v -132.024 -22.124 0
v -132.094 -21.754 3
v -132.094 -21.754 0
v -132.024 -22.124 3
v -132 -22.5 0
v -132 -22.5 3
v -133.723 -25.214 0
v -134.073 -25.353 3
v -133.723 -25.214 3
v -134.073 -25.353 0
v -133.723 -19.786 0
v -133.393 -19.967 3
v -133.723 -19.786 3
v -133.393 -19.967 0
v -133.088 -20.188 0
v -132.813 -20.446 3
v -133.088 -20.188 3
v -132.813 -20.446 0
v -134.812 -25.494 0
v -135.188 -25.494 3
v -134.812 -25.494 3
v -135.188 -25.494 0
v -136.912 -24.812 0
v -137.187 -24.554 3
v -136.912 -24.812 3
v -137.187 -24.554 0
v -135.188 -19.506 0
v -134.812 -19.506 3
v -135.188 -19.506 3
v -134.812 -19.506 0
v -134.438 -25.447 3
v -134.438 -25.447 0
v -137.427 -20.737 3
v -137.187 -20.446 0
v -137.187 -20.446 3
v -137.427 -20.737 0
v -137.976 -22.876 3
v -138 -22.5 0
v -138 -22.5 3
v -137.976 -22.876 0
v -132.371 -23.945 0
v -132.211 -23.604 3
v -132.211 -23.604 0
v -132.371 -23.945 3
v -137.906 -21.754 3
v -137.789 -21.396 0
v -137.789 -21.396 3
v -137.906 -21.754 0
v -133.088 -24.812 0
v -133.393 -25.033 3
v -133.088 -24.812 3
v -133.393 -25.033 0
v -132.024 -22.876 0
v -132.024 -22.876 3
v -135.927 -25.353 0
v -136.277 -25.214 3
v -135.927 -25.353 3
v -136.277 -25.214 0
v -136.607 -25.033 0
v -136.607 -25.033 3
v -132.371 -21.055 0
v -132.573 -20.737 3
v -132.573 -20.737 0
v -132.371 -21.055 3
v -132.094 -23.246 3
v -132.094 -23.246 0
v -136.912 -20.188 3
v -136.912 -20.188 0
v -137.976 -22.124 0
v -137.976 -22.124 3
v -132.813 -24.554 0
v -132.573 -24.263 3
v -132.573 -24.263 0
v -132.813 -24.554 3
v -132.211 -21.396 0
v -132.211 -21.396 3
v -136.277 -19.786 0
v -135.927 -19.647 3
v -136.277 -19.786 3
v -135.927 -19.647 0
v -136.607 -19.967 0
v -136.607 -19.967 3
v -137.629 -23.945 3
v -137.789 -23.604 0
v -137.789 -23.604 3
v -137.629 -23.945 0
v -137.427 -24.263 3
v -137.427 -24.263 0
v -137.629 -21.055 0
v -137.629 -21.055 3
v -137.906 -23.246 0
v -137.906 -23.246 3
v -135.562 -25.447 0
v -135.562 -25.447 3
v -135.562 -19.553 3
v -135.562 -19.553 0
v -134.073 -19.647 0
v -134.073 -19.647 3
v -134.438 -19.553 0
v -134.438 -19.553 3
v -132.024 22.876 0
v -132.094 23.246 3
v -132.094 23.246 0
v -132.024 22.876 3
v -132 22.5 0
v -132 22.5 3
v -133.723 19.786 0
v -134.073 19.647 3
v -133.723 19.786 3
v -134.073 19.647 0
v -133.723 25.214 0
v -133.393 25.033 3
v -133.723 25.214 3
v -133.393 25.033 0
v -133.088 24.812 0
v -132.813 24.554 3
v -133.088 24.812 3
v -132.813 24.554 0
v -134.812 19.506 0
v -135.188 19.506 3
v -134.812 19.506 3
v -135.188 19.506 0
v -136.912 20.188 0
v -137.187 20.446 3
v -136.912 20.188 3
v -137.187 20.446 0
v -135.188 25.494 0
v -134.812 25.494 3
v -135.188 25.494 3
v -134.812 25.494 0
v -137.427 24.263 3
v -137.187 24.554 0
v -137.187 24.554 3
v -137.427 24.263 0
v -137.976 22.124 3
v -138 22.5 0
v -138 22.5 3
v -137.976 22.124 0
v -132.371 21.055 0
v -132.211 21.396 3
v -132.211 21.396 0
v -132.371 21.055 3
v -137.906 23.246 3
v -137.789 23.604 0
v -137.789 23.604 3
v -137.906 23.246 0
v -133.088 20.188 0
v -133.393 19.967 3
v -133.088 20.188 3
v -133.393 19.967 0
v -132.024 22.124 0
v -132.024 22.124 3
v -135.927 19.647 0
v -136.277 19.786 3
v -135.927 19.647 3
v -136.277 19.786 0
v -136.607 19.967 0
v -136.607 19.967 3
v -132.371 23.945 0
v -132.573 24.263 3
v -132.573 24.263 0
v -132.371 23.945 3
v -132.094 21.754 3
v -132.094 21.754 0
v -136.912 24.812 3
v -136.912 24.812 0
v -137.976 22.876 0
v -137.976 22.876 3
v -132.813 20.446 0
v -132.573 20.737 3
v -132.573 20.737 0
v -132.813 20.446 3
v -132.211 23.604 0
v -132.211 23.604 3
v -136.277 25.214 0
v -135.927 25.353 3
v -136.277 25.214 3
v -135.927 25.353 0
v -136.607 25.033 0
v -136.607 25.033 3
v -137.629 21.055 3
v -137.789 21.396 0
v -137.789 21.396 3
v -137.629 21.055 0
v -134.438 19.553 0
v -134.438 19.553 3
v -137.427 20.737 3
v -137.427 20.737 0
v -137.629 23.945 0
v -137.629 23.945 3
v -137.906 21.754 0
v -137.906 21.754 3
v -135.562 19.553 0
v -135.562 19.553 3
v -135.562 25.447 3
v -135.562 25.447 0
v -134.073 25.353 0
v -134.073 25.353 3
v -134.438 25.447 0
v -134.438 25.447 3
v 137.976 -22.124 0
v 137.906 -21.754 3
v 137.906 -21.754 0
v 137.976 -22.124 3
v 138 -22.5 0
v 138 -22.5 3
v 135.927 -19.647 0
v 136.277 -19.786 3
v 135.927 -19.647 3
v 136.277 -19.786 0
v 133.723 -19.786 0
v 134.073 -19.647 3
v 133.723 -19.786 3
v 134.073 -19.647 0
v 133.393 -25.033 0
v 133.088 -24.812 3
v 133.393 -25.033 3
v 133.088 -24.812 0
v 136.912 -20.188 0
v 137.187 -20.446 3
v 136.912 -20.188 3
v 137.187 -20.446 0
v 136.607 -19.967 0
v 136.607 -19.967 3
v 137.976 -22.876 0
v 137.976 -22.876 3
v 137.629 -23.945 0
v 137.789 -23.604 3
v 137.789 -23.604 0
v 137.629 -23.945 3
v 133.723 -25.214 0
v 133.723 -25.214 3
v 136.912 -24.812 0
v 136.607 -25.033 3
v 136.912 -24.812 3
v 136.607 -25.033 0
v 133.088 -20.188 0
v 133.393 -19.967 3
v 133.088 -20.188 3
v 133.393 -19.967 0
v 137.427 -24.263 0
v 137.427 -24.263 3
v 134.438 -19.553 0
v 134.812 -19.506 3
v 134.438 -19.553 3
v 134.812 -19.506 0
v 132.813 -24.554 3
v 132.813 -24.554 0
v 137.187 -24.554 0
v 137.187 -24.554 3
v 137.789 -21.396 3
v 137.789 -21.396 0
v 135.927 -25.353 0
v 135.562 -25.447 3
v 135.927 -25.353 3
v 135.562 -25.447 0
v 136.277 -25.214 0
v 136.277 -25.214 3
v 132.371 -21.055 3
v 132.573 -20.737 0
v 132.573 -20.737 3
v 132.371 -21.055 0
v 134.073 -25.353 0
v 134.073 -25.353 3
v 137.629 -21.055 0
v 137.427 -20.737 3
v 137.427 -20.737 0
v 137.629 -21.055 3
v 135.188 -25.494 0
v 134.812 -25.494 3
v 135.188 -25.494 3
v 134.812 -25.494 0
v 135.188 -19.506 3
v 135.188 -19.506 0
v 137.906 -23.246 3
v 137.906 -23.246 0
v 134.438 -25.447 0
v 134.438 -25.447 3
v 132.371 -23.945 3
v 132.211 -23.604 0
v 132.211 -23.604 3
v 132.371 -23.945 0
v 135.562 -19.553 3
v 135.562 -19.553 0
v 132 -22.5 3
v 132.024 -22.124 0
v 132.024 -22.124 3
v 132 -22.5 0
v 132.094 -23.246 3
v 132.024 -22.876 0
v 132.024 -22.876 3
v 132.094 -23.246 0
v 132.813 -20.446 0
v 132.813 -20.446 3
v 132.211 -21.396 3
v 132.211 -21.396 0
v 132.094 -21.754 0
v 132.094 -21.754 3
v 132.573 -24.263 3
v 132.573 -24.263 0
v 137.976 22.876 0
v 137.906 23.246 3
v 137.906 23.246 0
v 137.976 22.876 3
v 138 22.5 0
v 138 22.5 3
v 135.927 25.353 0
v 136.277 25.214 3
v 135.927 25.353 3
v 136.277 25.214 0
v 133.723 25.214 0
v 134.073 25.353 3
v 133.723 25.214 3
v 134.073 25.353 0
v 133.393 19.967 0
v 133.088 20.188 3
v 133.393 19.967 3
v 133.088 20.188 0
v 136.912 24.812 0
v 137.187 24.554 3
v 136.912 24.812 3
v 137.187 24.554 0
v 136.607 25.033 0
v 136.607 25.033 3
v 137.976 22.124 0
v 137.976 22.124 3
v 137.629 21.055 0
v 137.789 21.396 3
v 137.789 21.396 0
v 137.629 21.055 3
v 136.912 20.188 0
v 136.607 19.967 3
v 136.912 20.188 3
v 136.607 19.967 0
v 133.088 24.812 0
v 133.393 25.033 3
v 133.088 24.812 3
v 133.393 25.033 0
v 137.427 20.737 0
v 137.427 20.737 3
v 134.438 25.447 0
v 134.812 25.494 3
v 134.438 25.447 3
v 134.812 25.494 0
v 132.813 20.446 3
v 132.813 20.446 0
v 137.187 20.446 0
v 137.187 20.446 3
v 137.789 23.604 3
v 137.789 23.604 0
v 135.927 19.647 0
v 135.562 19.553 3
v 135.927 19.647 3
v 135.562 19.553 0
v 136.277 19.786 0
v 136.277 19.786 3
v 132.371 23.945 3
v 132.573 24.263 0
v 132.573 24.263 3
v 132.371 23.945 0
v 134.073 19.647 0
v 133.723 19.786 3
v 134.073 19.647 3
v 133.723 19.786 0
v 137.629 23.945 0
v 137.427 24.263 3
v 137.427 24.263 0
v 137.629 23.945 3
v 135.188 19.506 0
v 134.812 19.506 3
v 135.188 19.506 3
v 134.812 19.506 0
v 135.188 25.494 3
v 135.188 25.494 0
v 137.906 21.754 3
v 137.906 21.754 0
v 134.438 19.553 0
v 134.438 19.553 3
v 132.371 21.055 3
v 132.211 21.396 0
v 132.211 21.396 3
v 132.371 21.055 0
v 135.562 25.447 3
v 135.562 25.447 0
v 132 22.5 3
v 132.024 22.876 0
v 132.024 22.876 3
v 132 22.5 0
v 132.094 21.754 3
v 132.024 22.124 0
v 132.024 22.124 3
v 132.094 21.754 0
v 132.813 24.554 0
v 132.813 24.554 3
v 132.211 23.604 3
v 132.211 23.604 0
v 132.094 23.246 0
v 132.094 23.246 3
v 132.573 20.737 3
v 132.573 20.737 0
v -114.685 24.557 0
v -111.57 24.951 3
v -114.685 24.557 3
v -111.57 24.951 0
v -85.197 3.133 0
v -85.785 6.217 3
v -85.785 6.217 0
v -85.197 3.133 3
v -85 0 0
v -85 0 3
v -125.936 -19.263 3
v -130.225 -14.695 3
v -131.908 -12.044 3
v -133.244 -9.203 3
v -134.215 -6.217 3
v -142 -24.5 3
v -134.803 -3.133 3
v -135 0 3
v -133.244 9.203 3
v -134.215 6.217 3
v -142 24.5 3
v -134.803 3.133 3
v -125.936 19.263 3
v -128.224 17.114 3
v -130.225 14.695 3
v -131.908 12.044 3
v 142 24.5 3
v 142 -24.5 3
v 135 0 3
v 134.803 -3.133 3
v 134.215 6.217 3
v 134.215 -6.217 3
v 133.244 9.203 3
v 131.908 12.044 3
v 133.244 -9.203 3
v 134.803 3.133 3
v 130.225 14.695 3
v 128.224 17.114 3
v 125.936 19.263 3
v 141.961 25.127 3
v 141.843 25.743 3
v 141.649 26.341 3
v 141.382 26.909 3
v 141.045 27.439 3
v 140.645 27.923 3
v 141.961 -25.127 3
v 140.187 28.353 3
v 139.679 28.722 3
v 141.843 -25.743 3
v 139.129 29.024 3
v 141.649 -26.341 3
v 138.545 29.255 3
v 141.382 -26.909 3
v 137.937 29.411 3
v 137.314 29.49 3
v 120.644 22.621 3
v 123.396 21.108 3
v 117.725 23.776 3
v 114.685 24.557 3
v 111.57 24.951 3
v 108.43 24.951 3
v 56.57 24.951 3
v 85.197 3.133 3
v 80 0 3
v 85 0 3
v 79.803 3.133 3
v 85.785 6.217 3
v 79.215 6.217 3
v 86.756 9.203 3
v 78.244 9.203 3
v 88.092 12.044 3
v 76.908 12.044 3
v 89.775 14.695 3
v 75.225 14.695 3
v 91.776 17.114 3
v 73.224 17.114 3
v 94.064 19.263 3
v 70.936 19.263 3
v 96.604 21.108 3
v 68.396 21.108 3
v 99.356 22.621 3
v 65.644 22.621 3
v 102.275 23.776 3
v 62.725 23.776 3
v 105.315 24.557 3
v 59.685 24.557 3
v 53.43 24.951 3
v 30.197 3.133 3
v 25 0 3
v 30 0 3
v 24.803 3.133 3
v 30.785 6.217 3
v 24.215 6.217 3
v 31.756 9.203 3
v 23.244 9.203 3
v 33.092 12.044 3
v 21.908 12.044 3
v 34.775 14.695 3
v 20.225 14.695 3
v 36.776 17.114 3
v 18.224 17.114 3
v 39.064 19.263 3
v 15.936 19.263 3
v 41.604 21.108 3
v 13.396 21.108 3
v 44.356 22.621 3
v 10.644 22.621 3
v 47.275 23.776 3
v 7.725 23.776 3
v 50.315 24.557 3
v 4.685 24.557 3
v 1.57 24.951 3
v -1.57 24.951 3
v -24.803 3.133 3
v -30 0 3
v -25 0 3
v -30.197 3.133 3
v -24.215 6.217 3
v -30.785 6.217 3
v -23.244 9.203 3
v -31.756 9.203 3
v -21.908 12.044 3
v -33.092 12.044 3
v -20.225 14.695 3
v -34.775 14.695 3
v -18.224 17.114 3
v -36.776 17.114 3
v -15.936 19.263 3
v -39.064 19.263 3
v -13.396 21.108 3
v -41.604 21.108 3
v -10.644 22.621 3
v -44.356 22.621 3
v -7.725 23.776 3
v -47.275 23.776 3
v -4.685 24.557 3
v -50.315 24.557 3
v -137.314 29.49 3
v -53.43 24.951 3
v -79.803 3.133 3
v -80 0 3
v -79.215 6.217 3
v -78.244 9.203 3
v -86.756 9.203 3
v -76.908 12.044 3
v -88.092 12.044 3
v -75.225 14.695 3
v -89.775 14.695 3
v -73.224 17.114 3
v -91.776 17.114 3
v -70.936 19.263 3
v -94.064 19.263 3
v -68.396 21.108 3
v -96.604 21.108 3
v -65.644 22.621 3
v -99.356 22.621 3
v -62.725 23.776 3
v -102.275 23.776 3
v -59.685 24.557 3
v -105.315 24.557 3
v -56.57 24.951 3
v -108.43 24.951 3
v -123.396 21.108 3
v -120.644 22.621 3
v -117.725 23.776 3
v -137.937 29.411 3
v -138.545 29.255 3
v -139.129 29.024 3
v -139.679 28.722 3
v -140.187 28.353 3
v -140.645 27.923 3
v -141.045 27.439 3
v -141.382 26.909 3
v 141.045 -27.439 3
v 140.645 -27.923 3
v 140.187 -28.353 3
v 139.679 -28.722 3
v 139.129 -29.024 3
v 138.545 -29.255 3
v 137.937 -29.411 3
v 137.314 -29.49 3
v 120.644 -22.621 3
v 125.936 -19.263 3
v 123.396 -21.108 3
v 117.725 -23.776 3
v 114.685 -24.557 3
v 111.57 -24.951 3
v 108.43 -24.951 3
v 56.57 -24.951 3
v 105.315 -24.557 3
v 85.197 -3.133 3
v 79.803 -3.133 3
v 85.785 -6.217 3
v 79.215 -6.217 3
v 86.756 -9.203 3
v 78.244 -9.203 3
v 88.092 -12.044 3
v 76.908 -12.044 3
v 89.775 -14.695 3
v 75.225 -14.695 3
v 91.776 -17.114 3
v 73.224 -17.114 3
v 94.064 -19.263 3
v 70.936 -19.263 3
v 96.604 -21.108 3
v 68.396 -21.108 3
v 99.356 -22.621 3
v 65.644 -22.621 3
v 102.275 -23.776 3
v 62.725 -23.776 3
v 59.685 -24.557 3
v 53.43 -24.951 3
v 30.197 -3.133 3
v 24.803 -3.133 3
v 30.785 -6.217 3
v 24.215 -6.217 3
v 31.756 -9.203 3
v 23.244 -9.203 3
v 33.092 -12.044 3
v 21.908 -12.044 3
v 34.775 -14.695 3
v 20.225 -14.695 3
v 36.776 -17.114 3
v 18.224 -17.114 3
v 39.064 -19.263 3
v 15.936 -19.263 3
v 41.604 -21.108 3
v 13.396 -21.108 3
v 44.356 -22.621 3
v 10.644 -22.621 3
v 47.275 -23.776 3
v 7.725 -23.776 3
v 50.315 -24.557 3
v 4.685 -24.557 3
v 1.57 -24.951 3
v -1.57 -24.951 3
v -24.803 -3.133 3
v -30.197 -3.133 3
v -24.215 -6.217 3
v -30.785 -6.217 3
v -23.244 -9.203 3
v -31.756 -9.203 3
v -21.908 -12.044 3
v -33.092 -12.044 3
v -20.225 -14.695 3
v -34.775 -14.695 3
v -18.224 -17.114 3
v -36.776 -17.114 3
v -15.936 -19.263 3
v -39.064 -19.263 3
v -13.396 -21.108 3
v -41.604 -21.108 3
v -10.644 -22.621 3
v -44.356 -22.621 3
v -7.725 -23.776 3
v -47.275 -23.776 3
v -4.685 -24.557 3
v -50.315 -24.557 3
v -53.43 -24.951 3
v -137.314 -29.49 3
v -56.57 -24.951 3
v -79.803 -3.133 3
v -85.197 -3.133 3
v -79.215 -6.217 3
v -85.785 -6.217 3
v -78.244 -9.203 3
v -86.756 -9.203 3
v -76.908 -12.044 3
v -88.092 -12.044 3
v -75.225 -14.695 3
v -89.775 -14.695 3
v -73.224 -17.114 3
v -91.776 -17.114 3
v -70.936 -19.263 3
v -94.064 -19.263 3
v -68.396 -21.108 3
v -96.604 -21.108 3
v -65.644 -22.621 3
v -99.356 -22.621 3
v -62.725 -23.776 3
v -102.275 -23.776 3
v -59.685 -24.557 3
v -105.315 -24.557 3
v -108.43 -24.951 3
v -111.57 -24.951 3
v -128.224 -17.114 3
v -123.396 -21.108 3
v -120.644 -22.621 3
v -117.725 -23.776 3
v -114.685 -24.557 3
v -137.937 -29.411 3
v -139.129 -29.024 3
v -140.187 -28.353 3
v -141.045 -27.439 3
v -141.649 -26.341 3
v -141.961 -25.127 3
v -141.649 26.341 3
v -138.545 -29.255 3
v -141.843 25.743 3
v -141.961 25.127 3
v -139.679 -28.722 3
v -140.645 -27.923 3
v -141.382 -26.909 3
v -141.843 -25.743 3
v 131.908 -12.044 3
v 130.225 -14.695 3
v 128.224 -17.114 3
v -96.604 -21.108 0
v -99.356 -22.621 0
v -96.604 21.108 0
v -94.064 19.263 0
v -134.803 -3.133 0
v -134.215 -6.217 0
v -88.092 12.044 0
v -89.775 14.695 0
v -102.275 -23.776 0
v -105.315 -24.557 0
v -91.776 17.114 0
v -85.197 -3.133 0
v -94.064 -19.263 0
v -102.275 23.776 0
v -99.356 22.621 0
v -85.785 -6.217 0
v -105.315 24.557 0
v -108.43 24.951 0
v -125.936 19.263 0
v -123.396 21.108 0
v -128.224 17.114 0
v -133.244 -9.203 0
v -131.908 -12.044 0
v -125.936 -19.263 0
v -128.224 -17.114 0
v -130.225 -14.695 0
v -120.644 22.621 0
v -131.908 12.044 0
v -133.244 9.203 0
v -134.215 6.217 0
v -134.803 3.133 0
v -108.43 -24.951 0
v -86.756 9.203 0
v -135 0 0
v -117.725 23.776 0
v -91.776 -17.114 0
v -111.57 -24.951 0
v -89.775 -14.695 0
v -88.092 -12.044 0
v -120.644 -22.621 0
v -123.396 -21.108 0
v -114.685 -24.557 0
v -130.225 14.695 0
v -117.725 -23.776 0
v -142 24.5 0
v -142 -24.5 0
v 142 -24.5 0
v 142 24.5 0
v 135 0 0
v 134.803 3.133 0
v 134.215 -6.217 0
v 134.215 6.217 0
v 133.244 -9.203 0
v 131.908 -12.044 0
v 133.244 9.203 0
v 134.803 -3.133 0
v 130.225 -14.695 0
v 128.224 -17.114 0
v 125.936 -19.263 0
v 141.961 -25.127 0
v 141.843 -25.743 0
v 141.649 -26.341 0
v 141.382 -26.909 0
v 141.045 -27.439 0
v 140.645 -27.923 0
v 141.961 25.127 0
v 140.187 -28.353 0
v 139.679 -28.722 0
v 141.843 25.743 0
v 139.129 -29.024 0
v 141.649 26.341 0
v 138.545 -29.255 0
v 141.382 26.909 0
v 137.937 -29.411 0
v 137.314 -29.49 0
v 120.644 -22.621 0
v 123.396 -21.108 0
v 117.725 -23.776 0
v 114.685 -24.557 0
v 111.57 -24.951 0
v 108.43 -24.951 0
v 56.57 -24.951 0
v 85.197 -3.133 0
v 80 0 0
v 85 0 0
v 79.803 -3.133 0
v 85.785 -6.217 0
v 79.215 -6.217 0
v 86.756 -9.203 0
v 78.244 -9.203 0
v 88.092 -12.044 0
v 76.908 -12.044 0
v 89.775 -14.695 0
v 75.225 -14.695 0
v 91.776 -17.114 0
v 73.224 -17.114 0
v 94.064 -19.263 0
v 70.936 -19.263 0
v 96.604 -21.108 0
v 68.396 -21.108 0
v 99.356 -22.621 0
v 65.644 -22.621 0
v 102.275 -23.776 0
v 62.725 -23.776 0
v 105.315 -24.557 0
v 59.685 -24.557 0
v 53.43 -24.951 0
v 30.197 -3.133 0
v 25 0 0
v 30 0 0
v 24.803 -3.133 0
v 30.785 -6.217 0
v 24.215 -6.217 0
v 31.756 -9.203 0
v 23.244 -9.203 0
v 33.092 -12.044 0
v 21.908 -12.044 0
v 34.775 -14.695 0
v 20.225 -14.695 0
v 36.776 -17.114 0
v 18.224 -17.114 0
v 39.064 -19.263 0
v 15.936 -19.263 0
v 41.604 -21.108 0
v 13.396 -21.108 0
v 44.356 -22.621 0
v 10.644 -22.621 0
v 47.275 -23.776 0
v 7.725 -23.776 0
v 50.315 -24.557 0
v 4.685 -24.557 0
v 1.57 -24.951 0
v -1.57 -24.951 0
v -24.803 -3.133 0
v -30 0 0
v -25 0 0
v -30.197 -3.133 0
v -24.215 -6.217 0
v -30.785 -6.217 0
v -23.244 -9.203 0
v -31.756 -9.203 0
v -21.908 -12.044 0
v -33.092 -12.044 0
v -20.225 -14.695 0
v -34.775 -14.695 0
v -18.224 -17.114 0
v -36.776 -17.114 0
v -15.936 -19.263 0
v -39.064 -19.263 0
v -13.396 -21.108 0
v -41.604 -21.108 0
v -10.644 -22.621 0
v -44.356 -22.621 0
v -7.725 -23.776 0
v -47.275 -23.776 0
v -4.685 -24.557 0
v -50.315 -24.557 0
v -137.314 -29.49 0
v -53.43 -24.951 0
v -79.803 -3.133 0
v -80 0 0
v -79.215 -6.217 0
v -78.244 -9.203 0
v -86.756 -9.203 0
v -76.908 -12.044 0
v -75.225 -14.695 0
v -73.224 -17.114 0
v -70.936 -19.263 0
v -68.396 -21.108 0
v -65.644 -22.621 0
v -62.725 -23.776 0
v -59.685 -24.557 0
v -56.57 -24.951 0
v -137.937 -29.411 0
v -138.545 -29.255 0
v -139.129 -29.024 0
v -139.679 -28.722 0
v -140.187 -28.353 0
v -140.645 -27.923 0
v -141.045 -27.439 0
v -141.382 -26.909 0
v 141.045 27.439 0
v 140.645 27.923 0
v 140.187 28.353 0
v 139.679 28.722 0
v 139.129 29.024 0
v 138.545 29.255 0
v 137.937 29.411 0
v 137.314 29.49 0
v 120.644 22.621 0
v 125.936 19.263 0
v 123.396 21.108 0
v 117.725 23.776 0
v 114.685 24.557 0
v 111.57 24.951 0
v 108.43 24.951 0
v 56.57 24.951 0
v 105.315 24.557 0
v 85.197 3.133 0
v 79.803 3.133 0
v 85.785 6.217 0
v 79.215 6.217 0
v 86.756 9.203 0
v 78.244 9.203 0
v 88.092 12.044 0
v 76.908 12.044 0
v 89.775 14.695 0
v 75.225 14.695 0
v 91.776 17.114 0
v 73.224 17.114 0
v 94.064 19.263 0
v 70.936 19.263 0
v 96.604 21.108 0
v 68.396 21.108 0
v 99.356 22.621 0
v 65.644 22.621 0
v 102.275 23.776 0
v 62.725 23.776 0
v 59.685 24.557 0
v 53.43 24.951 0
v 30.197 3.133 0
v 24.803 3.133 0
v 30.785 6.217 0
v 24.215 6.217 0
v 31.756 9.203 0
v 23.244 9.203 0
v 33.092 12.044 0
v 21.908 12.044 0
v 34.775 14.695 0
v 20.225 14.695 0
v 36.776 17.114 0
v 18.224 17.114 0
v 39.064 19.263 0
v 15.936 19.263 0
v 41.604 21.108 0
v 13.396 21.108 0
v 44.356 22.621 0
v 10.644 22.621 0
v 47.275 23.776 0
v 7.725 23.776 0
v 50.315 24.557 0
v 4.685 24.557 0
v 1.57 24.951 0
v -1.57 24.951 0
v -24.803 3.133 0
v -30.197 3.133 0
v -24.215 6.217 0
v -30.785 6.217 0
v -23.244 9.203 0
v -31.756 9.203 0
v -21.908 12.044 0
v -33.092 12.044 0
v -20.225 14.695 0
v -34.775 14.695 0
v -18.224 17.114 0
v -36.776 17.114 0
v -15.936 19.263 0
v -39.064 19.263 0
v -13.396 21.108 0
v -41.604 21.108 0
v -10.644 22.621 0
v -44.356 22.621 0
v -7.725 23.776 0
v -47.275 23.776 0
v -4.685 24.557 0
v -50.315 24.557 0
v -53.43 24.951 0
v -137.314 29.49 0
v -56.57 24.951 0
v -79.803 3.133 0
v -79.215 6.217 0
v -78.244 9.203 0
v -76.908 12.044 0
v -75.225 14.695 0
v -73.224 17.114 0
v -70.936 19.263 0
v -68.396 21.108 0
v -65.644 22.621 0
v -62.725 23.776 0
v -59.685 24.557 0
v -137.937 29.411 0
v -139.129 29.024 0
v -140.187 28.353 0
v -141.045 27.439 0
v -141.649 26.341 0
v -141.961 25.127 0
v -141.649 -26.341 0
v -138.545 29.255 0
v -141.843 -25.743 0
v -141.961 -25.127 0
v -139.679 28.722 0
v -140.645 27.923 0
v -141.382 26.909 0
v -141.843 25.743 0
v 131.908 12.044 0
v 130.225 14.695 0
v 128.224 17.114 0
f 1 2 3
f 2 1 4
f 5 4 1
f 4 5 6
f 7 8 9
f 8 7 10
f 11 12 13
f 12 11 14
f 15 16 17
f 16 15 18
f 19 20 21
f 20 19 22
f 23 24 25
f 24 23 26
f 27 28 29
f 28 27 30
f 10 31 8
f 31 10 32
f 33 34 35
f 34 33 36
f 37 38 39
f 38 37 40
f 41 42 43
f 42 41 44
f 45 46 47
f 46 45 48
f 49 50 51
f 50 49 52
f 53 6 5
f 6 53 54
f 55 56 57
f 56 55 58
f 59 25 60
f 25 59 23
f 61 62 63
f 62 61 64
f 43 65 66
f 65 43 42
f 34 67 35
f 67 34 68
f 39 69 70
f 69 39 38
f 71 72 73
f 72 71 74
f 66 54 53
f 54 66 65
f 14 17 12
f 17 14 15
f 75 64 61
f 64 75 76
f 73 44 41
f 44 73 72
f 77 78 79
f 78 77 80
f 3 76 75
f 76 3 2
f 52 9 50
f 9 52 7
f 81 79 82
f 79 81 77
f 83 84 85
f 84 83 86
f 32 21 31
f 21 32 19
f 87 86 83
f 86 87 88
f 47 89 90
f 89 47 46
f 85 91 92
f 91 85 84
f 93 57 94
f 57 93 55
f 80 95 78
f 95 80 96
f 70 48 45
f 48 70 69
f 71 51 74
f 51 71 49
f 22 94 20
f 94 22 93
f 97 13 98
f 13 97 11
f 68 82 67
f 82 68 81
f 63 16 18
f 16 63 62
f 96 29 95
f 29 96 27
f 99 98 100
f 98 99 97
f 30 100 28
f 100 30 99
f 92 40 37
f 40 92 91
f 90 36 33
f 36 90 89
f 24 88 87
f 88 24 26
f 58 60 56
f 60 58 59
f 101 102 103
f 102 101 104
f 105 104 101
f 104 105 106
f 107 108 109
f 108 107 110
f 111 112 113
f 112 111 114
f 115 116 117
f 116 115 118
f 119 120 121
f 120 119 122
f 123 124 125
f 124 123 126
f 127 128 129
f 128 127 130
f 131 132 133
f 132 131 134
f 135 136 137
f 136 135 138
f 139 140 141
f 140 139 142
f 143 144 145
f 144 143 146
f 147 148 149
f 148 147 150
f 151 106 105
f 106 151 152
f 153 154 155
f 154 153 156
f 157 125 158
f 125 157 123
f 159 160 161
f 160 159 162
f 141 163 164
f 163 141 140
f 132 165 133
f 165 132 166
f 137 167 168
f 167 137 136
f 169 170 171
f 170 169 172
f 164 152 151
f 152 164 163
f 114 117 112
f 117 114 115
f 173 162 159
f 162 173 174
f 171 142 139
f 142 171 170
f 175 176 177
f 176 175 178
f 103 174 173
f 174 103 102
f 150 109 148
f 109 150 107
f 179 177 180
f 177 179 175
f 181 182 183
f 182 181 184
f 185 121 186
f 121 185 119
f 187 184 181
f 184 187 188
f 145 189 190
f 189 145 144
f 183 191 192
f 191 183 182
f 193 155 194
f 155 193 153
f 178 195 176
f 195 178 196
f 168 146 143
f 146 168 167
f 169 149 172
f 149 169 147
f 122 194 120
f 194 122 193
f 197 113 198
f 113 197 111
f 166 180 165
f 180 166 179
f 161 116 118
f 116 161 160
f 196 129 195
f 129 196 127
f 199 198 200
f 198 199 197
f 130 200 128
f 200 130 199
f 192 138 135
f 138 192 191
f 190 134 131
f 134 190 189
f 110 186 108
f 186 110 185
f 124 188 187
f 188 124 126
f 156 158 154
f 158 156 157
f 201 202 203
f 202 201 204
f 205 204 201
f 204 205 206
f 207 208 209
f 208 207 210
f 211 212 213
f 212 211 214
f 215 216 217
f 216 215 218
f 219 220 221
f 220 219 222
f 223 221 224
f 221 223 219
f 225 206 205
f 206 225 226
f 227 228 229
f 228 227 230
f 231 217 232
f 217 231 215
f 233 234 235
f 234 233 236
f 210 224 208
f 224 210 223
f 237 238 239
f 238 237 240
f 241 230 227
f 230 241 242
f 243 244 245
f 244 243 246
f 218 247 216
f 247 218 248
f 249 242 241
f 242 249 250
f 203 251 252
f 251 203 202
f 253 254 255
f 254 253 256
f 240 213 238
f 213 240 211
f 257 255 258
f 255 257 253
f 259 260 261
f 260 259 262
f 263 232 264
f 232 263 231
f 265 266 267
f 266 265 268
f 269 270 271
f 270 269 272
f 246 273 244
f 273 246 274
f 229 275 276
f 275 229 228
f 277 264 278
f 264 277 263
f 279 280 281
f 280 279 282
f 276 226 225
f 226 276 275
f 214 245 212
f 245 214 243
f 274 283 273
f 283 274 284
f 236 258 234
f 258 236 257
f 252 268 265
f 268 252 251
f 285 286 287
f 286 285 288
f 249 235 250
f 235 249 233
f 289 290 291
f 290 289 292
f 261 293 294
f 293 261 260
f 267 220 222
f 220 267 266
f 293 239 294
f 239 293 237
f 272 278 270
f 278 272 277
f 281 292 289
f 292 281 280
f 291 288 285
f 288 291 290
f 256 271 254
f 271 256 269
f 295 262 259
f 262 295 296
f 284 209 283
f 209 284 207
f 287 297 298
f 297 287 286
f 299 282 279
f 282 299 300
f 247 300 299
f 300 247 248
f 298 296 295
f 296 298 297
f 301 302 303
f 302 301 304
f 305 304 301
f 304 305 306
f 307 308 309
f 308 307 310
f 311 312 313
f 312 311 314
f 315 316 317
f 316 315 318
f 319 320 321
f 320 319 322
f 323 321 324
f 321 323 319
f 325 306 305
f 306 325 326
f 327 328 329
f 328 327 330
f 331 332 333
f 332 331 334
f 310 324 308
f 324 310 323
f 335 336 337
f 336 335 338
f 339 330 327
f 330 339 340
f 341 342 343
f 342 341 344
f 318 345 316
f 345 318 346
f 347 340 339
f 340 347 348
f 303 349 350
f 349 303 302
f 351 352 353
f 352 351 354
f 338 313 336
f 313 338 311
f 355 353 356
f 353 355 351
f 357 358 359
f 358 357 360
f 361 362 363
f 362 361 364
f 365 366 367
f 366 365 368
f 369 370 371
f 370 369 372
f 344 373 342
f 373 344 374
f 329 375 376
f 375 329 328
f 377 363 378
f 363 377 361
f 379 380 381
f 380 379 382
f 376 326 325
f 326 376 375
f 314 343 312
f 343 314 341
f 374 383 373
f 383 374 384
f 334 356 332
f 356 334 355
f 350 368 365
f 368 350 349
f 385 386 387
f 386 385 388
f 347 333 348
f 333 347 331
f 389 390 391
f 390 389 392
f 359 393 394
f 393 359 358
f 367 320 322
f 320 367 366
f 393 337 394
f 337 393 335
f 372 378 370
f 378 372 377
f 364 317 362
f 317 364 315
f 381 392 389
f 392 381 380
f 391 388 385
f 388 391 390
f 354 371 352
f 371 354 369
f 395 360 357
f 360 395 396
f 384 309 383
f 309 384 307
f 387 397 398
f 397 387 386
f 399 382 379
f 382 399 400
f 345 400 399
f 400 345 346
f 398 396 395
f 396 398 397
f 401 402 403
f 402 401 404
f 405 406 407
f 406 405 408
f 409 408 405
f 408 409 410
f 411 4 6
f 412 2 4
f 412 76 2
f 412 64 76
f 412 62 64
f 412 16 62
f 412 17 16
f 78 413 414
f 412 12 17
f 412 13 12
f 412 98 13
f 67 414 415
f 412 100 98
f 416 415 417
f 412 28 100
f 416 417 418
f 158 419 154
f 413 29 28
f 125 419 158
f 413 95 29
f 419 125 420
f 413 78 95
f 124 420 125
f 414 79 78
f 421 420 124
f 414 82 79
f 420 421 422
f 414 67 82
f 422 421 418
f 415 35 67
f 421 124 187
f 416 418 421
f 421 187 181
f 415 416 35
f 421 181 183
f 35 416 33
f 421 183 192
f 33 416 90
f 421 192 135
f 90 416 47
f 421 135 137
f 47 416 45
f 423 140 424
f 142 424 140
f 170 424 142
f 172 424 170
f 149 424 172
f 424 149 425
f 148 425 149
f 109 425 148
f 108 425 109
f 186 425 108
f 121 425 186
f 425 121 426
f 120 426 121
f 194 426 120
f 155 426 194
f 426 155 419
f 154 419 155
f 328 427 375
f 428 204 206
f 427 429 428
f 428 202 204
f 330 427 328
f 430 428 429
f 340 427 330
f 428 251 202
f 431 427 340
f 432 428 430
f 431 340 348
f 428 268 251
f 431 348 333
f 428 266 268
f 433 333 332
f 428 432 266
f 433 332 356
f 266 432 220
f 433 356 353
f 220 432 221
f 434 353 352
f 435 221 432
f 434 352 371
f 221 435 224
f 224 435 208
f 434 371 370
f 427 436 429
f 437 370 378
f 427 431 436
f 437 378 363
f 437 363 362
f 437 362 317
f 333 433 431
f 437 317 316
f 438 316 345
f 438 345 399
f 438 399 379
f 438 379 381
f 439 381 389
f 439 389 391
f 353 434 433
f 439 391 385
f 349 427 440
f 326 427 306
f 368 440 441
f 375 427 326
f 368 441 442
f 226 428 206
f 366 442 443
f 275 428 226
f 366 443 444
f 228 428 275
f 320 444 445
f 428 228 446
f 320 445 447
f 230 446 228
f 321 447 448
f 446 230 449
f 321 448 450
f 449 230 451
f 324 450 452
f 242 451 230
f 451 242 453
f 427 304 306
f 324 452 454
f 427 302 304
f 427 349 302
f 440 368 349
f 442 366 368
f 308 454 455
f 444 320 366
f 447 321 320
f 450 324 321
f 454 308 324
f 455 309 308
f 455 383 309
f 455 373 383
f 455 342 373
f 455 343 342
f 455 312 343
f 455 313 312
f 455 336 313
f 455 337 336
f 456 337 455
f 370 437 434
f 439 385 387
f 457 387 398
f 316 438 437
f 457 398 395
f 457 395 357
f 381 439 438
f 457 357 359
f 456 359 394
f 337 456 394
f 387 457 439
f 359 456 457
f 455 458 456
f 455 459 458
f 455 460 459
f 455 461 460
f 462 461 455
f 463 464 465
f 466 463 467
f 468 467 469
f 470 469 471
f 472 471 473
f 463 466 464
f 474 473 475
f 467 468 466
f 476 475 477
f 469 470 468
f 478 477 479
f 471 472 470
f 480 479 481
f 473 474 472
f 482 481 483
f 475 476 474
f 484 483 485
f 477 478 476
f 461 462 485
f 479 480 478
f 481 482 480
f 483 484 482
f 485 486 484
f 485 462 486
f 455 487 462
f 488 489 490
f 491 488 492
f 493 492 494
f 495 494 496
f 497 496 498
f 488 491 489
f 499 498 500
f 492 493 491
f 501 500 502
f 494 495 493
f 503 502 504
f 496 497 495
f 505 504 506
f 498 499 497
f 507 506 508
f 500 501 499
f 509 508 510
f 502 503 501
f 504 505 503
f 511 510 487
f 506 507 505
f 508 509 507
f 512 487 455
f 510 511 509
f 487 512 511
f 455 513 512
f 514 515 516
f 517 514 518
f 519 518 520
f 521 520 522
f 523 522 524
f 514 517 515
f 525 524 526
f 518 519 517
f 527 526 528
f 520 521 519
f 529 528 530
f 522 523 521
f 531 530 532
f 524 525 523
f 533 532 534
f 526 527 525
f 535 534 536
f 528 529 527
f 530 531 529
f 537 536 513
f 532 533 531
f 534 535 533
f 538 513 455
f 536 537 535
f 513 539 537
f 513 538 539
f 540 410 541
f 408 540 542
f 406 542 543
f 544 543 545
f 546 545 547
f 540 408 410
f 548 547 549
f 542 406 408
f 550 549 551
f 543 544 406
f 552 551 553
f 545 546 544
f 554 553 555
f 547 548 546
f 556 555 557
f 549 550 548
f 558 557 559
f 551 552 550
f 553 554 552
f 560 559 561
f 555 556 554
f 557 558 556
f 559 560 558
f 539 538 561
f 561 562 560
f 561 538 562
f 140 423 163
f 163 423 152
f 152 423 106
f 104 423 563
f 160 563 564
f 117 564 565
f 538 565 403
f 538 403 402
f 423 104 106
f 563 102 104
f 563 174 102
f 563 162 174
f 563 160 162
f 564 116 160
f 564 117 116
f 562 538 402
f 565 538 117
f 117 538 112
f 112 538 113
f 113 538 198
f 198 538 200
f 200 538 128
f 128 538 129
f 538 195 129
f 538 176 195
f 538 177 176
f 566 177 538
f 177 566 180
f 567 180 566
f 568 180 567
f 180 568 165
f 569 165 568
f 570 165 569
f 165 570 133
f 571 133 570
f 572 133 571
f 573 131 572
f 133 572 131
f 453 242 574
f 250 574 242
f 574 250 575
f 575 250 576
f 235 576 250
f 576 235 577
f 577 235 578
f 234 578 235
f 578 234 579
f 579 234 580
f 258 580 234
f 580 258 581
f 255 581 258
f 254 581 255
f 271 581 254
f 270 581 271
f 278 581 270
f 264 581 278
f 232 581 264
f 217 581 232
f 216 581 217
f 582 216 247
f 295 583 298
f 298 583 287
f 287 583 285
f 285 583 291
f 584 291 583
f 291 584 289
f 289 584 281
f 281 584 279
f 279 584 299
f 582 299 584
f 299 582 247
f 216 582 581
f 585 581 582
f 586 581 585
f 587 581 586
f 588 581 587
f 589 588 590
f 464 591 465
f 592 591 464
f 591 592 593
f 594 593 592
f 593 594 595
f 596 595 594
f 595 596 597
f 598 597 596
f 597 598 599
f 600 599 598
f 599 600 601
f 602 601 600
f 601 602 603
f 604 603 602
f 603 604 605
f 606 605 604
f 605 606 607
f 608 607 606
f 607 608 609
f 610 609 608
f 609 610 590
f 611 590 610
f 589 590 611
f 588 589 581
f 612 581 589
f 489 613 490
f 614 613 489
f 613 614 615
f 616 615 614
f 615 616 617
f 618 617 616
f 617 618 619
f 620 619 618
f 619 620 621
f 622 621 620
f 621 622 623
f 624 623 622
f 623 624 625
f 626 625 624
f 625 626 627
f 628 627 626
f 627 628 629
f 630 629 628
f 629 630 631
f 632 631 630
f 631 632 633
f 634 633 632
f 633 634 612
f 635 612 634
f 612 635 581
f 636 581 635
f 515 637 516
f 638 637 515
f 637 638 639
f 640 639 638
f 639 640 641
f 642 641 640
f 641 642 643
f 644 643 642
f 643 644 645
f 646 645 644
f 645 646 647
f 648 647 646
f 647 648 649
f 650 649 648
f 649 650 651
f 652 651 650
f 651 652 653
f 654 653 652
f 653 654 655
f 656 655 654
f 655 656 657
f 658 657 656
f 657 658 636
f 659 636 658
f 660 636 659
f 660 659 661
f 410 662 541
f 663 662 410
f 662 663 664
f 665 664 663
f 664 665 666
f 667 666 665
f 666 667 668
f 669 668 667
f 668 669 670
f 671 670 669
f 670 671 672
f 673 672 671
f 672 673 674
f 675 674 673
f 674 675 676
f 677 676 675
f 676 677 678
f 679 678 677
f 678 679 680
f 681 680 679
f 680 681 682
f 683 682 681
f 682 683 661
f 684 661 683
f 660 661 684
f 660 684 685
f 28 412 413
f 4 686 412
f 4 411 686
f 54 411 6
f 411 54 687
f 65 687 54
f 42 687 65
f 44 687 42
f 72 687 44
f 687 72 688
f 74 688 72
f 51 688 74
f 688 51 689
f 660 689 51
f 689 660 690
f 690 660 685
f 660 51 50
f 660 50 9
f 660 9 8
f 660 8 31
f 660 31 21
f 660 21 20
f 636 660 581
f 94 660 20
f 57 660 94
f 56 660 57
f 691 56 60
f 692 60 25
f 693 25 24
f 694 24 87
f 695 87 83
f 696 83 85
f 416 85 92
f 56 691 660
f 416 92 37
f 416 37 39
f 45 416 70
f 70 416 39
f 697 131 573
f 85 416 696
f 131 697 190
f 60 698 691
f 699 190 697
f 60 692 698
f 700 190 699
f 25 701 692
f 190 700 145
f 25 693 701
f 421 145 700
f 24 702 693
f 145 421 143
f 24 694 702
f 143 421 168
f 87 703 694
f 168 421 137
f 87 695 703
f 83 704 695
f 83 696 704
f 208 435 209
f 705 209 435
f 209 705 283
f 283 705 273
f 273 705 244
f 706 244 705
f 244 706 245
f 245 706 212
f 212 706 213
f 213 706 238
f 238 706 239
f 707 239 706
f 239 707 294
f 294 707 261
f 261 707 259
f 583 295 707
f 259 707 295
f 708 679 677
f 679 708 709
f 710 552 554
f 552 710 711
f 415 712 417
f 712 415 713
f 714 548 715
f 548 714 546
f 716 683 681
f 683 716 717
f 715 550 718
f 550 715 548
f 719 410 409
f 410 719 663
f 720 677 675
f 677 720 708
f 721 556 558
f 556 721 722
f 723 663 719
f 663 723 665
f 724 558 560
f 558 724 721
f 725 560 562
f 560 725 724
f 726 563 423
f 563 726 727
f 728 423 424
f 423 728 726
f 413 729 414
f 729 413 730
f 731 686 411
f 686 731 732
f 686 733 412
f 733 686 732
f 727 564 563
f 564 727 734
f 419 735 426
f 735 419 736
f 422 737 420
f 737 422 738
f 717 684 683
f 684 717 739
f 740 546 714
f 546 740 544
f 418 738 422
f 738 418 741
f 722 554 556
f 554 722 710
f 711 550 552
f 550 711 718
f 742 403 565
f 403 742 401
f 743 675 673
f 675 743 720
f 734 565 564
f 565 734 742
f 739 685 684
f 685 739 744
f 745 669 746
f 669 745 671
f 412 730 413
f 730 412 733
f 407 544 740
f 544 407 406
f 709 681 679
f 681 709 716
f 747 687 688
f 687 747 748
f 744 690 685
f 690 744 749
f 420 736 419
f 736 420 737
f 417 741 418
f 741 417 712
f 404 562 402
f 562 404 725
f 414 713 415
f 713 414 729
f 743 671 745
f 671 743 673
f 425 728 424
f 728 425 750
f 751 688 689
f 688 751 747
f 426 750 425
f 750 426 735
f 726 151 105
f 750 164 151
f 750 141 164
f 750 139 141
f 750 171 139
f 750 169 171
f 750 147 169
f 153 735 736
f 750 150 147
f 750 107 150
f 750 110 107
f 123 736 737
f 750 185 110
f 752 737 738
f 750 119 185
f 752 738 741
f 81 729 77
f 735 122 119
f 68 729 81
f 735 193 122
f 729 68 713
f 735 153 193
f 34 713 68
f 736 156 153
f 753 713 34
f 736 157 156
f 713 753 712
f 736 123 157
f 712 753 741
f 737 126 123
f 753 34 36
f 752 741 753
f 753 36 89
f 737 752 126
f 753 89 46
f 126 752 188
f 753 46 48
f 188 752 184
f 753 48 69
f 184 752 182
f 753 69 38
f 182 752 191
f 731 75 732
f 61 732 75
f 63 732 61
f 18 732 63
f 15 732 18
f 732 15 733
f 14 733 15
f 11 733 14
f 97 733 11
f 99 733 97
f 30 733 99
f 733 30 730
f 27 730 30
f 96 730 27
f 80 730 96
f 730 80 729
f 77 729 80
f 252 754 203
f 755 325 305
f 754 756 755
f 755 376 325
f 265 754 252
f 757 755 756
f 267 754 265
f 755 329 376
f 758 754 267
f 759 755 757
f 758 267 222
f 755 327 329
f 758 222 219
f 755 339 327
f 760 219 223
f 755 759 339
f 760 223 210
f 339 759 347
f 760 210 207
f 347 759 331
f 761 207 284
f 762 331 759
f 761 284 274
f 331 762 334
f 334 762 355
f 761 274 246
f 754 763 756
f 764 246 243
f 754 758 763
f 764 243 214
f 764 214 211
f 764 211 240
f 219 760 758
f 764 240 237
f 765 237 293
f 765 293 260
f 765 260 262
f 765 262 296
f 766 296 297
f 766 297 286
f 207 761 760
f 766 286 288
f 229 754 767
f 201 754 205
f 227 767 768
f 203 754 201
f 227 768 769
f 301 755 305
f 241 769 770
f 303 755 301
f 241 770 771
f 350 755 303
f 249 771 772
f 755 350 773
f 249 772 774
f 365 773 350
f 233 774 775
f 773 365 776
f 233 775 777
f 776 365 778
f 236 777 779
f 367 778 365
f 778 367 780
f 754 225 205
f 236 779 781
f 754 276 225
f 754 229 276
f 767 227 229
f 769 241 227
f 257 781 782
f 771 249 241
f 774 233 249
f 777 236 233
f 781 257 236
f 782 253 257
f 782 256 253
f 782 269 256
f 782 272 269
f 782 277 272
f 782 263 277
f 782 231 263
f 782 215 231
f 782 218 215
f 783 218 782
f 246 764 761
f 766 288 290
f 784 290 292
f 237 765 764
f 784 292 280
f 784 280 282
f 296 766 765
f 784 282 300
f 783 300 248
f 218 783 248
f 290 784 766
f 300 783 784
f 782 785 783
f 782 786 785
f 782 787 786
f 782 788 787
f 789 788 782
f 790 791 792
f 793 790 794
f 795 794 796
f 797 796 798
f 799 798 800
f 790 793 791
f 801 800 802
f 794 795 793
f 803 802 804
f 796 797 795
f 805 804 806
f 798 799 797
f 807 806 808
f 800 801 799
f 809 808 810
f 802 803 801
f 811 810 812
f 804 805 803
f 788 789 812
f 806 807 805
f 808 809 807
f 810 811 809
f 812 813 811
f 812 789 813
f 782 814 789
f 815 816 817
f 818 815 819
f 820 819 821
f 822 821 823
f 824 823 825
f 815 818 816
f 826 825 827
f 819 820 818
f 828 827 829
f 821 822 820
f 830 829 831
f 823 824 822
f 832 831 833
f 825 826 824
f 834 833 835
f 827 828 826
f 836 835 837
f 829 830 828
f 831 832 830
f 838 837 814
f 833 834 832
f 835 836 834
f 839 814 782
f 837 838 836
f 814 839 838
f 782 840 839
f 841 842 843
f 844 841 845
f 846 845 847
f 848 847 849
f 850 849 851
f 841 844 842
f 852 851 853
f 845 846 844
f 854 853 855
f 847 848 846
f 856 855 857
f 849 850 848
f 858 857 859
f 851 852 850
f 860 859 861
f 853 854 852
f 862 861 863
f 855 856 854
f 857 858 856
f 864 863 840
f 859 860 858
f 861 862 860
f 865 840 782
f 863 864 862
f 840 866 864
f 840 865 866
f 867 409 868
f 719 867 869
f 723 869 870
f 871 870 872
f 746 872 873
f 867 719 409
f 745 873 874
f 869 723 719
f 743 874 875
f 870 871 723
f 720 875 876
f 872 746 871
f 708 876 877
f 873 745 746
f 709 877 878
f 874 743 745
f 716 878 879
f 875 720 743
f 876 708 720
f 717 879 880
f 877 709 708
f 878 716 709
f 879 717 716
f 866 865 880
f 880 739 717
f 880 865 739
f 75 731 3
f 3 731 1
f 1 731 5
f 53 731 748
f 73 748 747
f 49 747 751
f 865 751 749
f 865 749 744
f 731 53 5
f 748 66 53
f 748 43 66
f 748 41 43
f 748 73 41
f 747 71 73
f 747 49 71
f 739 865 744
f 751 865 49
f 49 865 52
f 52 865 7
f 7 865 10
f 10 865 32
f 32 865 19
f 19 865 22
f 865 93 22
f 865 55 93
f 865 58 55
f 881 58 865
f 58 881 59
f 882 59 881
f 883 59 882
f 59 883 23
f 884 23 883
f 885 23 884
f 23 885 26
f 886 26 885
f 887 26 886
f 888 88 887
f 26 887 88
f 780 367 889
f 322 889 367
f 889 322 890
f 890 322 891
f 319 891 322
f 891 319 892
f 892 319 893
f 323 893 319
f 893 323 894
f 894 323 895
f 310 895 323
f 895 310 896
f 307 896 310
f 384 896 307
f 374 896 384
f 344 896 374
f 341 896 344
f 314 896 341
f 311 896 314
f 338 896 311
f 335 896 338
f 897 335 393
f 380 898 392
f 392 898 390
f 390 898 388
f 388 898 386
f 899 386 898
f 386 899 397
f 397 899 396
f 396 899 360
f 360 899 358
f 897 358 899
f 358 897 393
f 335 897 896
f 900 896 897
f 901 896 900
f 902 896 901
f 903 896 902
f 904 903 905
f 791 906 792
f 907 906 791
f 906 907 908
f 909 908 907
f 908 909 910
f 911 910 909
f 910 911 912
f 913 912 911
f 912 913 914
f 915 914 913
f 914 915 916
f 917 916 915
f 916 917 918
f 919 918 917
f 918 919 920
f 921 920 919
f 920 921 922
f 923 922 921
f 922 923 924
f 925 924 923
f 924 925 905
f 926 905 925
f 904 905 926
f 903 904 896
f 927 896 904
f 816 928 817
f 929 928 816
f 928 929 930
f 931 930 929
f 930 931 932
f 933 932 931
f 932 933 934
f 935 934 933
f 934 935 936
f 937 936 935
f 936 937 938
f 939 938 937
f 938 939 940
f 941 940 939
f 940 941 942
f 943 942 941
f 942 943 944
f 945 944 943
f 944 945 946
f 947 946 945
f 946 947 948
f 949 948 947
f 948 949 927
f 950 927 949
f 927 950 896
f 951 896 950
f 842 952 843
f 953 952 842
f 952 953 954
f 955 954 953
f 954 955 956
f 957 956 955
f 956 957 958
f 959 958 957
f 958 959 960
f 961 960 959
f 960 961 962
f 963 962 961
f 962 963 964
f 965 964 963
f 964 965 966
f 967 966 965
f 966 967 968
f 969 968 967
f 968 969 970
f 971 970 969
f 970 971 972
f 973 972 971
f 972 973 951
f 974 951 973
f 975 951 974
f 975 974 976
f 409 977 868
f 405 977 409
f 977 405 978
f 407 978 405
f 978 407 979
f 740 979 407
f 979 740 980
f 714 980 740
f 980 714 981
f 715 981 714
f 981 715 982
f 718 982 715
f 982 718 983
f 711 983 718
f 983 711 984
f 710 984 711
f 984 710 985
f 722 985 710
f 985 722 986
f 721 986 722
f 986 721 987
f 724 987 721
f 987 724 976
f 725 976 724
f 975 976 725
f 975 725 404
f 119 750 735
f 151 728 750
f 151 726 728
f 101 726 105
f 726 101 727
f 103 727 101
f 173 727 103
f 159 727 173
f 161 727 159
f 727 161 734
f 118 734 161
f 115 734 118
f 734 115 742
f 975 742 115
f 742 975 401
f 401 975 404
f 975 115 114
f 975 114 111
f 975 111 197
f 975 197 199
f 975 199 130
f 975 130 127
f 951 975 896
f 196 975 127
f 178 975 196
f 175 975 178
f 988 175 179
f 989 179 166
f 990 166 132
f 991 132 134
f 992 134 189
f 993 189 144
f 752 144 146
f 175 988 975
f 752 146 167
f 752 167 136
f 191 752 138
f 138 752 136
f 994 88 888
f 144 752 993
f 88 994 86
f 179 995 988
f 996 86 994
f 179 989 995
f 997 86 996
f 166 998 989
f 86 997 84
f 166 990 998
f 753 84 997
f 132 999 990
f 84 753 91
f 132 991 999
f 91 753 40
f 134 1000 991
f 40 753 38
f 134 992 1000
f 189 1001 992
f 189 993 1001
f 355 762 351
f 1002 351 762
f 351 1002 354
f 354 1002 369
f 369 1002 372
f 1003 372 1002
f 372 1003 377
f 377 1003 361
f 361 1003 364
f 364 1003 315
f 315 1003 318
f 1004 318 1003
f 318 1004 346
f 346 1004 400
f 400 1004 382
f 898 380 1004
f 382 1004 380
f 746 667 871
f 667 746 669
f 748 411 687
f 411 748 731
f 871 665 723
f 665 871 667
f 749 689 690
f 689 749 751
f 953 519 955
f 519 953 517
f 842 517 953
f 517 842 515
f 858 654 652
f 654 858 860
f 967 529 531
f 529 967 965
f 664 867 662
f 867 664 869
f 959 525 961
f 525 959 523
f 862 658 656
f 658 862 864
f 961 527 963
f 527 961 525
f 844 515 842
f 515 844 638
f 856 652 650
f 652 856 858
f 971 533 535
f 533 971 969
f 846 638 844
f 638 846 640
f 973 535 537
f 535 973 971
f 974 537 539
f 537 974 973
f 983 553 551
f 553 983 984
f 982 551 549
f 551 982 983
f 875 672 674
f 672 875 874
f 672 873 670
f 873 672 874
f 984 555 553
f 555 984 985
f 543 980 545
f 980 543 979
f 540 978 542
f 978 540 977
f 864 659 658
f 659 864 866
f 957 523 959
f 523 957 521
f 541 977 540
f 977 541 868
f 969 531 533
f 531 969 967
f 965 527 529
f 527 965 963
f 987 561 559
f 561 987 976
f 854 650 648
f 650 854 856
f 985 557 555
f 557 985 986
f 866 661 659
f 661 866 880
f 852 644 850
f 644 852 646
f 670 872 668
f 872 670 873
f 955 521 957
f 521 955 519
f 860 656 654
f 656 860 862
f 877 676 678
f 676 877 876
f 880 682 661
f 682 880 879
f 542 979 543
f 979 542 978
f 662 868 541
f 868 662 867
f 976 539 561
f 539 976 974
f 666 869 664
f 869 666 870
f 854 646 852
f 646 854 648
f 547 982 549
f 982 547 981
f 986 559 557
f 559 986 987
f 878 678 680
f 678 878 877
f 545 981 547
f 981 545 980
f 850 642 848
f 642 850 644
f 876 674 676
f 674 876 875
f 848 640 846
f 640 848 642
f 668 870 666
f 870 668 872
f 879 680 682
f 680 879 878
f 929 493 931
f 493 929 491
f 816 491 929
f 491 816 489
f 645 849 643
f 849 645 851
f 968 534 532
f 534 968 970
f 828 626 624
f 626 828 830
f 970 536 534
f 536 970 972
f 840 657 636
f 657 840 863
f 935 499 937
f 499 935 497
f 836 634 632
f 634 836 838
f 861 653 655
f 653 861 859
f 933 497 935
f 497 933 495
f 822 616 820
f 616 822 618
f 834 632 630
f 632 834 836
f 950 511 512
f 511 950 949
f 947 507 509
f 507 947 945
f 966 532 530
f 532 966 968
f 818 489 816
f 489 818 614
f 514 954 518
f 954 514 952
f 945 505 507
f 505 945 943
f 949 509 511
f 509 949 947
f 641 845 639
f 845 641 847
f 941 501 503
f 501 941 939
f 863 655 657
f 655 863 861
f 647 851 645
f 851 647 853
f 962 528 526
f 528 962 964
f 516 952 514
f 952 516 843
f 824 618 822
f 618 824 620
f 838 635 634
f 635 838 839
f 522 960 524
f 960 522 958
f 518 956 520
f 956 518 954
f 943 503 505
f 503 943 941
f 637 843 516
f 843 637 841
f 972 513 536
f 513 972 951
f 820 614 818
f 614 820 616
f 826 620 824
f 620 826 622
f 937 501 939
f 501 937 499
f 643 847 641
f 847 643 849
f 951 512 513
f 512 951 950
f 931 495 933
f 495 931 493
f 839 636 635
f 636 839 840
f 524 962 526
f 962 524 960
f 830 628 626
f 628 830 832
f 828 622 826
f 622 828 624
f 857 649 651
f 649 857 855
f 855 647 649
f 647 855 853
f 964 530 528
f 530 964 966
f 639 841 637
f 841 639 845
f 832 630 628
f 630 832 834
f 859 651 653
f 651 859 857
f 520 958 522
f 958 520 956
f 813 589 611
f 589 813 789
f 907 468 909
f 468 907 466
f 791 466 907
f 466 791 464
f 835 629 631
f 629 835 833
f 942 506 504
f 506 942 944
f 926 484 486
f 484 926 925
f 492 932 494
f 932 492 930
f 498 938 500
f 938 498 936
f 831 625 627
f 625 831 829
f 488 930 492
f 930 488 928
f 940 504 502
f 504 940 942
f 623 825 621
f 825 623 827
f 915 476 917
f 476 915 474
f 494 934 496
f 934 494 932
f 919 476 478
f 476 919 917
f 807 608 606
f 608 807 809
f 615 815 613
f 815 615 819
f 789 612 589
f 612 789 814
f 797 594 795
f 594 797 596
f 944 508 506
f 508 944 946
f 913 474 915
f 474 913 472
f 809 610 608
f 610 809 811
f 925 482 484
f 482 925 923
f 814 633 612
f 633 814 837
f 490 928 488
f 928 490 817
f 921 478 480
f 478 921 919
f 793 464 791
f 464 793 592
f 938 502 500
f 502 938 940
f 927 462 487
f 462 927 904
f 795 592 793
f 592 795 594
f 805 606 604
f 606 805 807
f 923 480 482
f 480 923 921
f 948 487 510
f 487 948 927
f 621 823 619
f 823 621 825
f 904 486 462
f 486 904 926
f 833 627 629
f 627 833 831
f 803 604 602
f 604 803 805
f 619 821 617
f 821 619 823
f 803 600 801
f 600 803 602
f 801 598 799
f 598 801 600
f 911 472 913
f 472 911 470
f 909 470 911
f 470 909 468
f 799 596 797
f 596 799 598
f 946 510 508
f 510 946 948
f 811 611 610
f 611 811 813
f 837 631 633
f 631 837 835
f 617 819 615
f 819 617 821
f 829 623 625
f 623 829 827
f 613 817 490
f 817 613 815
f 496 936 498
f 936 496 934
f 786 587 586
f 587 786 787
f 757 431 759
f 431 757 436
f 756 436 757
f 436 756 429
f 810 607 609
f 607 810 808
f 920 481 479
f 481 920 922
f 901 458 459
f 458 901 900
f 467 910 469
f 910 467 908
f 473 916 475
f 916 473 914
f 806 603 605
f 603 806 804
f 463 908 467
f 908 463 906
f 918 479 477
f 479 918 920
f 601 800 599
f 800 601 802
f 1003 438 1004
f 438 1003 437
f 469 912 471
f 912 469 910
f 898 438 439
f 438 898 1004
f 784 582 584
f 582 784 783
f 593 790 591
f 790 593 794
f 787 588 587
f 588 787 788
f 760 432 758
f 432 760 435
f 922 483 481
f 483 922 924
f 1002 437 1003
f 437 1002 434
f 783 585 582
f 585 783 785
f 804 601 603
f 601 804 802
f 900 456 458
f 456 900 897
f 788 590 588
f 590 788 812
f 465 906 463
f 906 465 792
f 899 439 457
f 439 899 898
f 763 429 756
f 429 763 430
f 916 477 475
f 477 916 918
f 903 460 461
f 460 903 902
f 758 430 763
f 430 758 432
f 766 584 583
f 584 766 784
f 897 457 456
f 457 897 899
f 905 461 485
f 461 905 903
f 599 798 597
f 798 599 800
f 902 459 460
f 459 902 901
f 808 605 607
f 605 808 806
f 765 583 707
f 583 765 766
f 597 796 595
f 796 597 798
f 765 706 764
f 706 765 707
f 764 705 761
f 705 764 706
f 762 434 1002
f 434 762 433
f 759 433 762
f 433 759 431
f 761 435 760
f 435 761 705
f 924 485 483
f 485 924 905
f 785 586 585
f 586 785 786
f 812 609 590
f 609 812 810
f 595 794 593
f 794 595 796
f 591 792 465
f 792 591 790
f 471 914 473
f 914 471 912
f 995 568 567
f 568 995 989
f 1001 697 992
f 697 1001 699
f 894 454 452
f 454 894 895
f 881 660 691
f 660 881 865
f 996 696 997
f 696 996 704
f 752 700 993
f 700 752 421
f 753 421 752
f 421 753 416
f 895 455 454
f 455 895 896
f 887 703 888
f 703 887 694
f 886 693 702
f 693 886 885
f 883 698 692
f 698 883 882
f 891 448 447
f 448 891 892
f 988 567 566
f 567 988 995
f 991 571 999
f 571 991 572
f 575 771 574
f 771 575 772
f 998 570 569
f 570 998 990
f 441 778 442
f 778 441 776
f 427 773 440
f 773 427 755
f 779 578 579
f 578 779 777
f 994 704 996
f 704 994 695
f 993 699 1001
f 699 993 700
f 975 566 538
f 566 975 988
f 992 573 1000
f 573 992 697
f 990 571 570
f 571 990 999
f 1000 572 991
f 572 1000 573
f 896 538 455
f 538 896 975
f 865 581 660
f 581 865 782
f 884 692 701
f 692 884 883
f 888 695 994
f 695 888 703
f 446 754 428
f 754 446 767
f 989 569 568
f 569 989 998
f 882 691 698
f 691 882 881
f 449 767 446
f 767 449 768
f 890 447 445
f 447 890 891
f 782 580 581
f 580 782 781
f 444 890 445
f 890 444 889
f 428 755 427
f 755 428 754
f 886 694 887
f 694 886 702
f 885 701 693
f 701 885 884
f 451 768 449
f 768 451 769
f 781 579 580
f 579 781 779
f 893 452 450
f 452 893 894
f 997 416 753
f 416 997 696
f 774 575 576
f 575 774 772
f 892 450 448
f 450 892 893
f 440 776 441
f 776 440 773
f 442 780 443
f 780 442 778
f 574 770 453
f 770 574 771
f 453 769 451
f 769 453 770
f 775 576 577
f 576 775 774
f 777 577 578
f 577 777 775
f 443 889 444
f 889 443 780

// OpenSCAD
$fn = 50;


difference() {
	union() {
		hull() {
			translate(v = [-137.0000000000, 24.5000000000, 0]) {
				cylinder(h = 3, r = 5);
			}
			translate(v = [137.0000000000, 24.5000000000, 0]) {
				cylinder(h = 3, r = 5);
			}
			translate(v = [-137.0000000000, -24.5000000000, 0]) {
				cylinder(h = 3, r = 5);
			}
			translate(v = [137.0000000000, -24.5000000000, 0]) {
				cylinder(h = 3, r = 5);
			}
		}
	}
	union() {
		#translate(v = [-135.0000000000, -22.5000000000, -100.0000000000]) {
			cylinder(h = 200, r = 3.0000000000);
		}
		#translate(v = [-135.0000000000, 22.5000000000, -100.0000000000]) {
			cylinder(h = 200, r = 3.0000000000);
		}
		#translate(v = [135.0000000000, -22.5000000000, -100.0000000000]) {
			cylinder(h = 200, r = 3.0000000000);
		}
		#translate(v = [135.0000000000, 22.5000000000, -100.0000000000]) {
			cylinder(h = 200, r = 3.0000000000);
		}
		#translate(v = [-110.0000000000, 0, 0]) {
			cylinder(h = 3, r = 25.0000000000);
		}
		#translate(v = [-55.0000000000, 0, 0]) {
			cylinder(h = 3, r = 25.0000000000);
		}
		#cylinder(h = 3, r = 25.0000000000);
		#translate(v = [55.0000000000, 0, 0]) {
			cylinder(h = 3, r = 25.0000000000);
		}
		#translate(v = [110.0000000000, 0, 0]) {
			cylinder(h = 3, r = 25.0000000000);
		}
	}
}
